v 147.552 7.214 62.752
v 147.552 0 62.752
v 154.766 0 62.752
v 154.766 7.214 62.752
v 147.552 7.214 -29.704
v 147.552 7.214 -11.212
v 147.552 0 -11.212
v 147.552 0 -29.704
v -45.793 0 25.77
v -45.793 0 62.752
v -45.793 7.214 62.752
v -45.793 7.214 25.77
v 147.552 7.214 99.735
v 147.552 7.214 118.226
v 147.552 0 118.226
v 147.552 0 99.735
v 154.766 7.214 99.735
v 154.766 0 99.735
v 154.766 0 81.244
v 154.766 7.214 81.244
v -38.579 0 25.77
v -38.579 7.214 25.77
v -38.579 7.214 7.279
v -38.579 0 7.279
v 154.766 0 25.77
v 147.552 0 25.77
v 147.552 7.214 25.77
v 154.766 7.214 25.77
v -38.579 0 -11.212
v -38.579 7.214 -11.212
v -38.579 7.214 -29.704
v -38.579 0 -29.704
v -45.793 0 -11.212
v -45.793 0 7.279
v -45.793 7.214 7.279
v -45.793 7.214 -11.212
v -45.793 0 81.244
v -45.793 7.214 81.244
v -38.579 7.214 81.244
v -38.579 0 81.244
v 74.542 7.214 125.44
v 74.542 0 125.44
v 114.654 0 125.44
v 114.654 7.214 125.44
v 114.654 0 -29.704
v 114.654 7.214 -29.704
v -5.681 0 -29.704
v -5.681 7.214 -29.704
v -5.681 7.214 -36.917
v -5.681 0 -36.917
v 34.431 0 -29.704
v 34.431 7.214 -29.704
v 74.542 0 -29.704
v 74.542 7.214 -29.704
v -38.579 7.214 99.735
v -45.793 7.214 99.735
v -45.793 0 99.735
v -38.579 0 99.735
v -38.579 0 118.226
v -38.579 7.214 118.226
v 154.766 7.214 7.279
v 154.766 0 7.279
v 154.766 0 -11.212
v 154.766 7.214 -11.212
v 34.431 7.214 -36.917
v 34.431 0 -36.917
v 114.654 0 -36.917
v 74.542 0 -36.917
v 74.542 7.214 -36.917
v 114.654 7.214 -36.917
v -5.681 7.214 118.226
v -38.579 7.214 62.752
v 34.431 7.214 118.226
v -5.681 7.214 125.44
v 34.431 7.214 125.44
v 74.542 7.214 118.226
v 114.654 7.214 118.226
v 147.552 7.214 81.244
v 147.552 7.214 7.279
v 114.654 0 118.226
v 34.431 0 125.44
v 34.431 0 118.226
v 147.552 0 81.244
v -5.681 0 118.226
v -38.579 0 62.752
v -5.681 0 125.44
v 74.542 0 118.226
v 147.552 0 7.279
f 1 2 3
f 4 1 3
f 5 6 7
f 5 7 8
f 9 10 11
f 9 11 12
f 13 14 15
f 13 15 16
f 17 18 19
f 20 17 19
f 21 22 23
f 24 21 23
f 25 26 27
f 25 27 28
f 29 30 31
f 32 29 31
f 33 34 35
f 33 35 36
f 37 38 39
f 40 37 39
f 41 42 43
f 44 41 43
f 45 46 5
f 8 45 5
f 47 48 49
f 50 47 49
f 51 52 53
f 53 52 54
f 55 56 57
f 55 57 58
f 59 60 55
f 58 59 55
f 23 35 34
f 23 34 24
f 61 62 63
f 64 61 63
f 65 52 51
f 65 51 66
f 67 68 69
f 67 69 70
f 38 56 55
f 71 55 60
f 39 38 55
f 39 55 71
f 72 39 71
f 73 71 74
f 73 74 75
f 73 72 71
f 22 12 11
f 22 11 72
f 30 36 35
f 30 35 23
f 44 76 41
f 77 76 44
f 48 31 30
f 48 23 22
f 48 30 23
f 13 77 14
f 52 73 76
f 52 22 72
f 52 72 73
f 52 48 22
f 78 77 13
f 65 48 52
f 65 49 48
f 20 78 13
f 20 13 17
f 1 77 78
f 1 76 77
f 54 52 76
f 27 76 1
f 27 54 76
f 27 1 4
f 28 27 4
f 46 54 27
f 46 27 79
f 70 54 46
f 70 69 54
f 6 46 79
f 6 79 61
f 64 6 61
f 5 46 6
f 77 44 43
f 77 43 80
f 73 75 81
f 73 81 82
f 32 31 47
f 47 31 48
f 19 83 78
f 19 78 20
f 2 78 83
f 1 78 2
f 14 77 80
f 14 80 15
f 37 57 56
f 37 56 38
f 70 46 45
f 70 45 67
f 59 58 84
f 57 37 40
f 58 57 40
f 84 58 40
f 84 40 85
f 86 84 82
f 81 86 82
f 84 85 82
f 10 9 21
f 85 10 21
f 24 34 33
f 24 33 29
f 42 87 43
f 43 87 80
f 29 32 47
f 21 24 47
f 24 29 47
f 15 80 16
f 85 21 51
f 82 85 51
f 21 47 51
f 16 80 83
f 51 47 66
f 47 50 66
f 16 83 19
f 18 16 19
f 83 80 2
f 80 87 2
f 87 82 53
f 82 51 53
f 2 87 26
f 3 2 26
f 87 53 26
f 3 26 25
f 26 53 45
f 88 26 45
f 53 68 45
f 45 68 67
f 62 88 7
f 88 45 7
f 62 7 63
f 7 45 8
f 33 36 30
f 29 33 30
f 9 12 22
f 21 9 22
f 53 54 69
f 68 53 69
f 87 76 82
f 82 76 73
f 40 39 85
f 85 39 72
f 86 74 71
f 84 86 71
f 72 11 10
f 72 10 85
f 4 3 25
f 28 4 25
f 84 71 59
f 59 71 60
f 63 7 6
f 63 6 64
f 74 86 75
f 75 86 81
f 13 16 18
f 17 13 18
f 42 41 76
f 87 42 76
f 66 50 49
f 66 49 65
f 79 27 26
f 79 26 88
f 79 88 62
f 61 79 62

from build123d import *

# Parameters (mm, degrees)
SKETCH1_W           = 200.5584
SKETCH1_H           = 162.3568
BOSS_EXTRUDE1_DEPTH = 7.2136
SKETCH2_W           = 7.2136
SKETCH2_H           = 18.4912
SKETCH2_W_2         = 20.05584
SKETCH2_H_2         = 7.2136
SKETCH2_W_3         = 40.11168
CUT_EXTRUDE1_DEPTH  = 200.347884659


with BuildPart() as part:
    # Sketch1 → Boss-Extrude1 (new body)
    with BuildSketch(Plane(origin=(0, 0, 0), x_dir=(1, 0, 0), z_dir=(0, 1, 0))):
        with Locations((54.486535415, -44.261267707)):
            Rectangle(SKETCH1_W, SKETCH1_H)
    extrude(amount=BOSS_EXTRUDE1_DEPTH)

    # Sketch2 → Cut-Extrude1 (cut, through all)
    with BuildSketch(Plane(origin=(0, 7.2136, 0), x_dir=(1, 0, 0), z_dir=(0, 1, 0))):
        with Locations((-42.185864585, -71.998067707)):
            Rectangle(SKETCH2_W, SKETCH2_H)
        with Locations((-42.185864585, -108.980467707)):
            Rectangle(SKETCH2_W, SKETCH2_H)
        Polygon((-45.792664585, -125.439667707), (-5.680984585, -125.439667707), (-5.680984585, -118.226067707), (-38.579064585, -118.226067707), (-45.792664585, -118.226067707), align=None)
        with Locations((64.514455415, -121.832867707)):
            Rectangle(SKETCH2_W_2, SKETCH2_H_2)
        with Locations((44.458615415, -121.832867707)):
            Rectangle(SKETCH2_W_2, SKETCH2_H_2)
        with Locations((134.709895415, -121.832867707)):
            Rectangle(SKETCH2_W_3, SKETCH2_H_2)
        with Locations((151.158935415, -108.980467707)):
            Rectangle(SKETCH2_W, SKETCH2_H)
        with Locations((151.158935415, -71.998067707)):
            Rectangle(SKETCH2_W, SKETCH2_H)
        with Locations((151.158935415, -16.524467707)):
            Rectangle(SKETCH2_W, SKETCH2_H)
        with Locations((151.158935415, 20.457932293)):
            Rectangle(SKETCH2_W, SKETCH2_H)
        with Locations((134.709895415, 33.310332293)):
            Rectangle(SKETCH2_W_3, SKETCH2_H_2)
        with Locations((54.486535415, 33.310332293)):
            Rectangle(SKETCH2_W_3, SKETCH2_H_2)
        with Locations((-42.185864585, -16.524467707)):
            Rectangle(SKETCH2_W, SKETCH2_H)
        with Locations((-42.185864585, 20.457932293)):
            Rectangle(SKETCH2_W, SKETCH2_H)
        with Locations((-25.736824585, 33.310332293)):
            Rectangle(SKETCH2_W_3, SKETCH2_H_2)
    extrude(amount=-CUT_EXTRUDE1_DEPTH, mode=Mode.SUBTRACT)


solid = part.part
